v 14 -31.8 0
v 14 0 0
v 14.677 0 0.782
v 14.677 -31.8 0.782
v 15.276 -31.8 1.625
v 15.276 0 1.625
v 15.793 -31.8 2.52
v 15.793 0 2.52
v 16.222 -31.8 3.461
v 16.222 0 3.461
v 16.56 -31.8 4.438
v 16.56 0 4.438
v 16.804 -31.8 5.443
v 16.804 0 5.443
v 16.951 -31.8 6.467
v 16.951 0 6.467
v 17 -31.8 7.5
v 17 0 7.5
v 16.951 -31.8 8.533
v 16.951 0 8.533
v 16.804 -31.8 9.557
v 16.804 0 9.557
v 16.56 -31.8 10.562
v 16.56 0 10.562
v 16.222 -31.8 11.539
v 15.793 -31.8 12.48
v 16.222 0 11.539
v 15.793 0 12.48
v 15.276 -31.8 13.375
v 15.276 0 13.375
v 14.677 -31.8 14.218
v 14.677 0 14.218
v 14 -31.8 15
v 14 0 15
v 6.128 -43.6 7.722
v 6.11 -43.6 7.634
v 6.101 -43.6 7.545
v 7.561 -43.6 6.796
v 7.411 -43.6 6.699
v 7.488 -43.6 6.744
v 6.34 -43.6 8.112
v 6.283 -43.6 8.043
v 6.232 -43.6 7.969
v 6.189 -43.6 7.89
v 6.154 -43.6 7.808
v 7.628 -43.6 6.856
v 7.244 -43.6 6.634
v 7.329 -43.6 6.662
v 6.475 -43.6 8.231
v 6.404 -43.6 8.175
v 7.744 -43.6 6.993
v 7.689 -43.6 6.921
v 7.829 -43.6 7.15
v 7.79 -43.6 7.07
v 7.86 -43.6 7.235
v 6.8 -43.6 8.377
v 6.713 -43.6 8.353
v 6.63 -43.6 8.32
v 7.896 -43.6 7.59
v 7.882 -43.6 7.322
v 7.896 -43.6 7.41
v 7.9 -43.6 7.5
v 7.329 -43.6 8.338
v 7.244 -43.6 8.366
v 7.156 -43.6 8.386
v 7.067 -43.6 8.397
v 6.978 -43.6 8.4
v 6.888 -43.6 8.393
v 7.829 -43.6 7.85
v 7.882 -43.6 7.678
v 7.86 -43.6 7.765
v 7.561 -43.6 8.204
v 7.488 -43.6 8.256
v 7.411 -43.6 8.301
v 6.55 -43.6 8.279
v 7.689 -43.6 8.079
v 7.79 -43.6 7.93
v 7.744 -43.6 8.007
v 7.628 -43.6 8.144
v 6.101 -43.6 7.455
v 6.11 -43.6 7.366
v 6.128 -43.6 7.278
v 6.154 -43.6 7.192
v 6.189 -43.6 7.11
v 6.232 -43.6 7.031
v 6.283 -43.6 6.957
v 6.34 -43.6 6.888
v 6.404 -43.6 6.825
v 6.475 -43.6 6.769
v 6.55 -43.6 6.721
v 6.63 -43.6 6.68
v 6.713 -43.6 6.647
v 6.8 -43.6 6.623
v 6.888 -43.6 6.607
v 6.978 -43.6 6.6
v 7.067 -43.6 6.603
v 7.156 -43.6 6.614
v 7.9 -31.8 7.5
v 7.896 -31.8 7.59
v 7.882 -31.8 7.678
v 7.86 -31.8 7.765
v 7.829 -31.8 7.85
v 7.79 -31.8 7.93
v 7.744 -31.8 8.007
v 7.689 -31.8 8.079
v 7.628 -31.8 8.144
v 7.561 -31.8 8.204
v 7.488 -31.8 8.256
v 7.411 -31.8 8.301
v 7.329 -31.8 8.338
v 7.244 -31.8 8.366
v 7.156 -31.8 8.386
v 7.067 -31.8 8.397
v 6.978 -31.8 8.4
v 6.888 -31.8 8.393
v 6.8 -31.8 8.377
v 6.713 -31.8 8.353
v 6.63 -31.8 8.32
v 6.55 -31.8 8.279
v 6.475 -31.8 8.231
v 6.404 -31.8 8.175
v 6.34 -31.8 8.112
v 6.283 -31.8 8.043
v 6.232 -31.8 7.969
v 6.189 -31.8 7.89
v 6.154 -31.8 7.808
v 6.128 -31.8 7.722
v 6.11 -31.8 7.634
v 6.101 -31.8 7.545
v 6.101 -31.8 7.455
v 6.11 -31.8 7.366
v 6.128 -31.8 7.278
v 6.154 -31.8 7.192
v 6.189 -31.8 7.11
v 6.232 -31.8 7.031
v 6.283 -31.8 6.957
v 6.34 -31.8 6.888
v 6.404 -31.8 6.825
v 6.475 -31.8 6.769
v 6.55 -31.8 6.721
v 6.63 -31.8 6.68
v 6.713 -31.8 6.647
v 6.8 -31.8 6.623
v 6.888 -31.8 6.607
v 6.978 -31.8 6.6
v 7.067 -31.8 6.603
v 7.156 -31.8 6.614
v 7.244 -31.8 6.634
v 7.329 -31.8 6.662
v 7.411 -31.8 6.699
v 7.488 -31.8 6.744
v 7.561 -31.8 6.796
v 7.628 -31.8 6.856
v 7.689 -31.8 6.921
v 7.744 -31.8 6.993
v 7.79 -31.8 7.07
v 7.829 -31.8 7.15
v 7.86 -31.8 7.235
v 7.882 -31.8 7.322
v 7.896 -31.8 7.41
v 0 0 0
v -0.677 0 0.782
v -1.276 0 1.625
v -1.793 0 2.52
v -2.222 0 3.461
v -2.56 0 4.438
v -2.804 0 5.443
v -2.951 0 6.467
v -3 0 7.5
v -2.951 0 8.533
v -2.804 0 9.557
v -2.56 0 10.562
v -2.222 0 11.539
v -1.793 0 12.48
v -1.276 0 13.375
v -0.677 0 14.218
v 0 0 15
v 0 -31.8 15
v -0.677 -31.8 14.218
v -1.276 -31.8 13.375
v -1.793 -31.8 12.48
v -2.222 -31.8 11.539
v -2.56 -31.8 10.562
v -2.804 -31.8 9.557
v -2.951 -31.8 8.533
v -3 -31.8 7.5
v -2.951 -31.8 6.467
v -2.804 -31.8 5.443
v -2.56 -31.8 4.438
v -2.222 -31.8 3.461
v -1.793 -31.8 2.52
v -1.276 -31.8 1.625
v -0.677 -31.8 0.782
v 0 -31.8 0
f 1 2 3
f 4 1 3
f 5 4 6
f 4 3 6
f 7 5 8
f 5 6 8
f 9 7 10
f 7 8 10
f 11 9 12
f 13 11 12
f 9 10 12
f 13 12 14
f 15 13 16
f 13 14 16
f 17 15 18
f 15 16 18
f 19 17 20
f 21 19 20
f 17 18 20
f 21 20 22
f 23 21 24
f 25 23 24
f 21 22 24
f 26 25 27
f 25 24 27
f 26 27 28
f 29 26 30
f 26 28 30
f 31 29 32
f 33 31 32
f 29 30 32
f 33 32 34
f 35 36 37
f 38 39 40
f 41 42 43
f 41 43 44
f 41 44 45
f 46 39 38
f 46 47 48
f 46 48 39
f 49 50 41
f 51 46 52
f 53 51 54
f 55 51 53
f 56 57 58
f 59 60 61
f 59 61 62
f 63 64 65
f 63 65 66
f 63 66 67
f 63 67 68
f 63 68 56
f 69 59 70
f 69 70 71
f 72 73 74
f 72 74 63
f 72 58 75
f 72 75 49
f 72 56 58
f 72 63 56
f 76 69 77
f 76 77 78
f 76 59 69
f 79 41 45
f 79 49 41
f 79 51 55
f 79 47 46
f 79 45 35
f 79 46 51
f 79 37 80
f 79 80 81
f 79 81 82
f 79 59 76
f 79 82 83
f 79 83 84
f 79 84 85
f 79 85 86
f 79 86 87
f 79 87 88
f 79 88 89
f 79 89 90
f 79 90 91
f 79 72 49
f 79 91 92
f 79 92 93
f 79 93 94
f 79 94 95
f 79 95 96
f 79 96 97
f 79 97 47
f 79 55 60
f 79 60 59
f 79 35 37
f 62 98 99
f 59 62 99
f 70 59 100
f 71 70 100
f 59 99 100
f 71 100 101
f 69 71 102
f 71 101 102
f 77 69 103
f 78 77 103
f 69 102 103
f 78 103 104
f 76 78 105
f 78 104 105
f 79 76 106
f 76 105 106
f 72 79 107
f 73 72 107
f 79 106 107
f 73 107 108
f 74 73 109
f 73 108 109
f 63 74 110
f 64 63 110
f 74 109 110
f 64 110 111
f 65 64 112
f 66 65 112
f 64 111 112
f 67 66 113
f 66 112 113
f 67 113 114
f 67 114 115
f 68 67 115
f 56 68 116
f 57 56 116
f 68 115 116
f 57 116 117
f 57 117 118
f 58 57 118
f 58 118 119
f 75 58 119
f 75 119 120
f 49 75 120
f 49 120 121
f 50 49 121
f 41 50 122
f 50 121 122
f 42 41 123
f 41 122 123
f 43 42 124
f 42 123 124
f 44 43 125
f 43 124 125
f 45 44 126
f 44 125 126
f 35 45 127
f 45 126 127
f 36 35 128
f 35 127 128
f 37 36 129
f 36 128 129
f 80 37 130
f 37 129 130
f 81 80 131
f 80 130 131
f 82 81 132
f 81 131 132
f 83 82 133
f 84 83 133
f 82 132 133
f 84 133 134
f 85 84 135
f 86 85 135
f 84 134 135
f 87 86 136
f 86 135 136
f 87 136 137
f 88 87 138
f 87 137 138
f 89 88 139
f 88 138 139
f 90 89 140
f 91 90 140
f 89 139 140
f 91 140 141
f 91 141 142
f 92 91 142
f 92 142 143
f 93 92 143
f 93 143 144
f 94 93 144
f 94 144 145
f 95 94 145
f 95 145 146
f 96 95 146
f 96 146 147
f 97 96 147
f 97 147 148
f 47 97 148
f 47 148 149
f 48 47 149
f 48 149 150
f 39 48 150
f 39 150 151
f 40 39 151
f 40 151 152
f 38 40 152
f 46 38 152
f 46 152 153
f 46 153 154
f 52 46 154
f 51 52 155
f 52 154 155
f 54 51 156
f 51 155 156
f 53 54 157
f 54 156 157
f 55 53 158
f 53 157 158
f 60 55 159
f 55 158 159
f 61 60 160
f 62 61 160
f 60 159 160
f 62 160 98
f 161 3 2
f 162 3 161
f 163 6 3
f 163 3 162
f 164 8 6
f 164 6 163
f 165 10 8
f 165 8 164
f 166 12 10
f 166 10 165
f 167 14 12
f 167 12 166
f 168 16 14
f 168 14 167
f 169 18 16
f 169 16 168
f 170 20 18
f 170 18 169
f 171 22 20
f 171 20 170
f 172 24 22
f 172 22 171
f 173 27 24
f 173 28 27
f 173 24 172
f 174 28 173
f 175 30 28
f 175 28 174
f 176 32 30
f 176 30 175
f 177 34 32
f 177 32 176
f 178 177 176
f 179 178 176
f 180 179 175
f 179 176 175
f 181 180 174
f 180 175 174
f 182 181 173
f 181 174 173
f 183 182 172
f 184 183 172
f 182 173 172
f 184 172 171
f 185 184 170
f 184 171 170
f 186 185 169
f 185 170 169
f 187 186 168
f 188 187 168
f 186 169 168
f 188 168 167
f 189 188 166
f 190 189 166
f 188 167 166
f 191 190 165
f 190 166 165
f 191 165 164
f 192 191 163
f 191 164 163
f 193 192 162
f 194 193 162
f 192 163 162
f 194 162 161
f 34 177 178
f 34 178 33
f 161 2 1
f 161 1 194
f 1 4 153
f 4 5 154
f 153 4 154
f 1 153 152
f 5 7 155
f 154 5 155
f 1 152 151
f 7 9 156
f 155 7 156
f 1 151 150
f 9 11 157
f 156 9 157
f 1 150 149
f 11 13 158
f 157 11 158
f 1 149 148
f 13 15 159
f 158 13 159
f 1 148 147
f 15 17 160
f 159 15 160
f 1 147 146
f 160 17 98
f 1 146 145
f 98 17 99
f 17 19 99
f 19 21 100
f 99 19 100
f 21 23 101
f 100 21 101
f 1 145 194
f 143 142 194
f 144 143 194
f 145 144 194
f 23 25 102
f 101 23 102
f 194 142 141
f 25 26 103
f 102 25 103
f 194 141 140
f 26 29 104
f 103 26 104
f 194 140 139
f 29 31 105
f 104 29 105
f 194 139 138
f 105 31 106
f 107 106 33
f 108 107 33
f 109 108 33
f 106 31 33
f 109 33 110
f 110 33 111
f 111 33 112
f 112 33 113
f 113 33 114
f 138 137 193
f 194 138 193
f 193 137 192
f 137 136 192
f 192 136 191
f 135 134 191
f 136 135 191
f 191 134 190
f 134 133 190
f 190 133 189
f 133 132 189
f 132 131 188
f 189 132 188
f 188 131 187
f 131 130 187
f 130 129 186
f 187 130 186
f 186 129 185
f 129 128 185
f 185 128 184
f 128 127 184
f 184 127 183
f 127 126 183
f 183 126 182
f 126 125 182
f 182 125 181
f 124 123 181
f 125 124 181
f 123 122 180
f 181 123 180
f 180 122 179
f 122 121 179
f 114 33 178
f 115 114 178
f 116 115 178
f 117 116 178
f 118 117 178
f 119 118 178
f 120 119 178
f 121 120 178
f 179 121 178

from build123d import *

# Parameters (mm, degrees)
PAD_DEPTH    = 31.8
SKETCH001_R  = 0.9
PAD001_DEPTH = 11.8


with BuildPart() as part:
    # Sketch → Pad (new body)
    with BuildSketch(Plane.XZ):
        with BuildLine():
            Line((0, 15), (14, 15))
            ThreePointArc((14, 0), (17, 7.5), (14, 15))
            Line((14, 0), (0, 0))
            ThreePointArc((0, 15), (-3, 7.5), (0, 0))
        make_face()
    extrude(amount=PAD_DEPTH)

    # Sketch001 (on Face6 of Pad) → Pad001 (join)
    with BuildSketch(Plane.XZ.offset(31.8)):
        with Locations((7, 7.5)):
            Circle(SKETCH001_R)
    extrude(amount=PAD001_DEPTH)


solid = part.part
